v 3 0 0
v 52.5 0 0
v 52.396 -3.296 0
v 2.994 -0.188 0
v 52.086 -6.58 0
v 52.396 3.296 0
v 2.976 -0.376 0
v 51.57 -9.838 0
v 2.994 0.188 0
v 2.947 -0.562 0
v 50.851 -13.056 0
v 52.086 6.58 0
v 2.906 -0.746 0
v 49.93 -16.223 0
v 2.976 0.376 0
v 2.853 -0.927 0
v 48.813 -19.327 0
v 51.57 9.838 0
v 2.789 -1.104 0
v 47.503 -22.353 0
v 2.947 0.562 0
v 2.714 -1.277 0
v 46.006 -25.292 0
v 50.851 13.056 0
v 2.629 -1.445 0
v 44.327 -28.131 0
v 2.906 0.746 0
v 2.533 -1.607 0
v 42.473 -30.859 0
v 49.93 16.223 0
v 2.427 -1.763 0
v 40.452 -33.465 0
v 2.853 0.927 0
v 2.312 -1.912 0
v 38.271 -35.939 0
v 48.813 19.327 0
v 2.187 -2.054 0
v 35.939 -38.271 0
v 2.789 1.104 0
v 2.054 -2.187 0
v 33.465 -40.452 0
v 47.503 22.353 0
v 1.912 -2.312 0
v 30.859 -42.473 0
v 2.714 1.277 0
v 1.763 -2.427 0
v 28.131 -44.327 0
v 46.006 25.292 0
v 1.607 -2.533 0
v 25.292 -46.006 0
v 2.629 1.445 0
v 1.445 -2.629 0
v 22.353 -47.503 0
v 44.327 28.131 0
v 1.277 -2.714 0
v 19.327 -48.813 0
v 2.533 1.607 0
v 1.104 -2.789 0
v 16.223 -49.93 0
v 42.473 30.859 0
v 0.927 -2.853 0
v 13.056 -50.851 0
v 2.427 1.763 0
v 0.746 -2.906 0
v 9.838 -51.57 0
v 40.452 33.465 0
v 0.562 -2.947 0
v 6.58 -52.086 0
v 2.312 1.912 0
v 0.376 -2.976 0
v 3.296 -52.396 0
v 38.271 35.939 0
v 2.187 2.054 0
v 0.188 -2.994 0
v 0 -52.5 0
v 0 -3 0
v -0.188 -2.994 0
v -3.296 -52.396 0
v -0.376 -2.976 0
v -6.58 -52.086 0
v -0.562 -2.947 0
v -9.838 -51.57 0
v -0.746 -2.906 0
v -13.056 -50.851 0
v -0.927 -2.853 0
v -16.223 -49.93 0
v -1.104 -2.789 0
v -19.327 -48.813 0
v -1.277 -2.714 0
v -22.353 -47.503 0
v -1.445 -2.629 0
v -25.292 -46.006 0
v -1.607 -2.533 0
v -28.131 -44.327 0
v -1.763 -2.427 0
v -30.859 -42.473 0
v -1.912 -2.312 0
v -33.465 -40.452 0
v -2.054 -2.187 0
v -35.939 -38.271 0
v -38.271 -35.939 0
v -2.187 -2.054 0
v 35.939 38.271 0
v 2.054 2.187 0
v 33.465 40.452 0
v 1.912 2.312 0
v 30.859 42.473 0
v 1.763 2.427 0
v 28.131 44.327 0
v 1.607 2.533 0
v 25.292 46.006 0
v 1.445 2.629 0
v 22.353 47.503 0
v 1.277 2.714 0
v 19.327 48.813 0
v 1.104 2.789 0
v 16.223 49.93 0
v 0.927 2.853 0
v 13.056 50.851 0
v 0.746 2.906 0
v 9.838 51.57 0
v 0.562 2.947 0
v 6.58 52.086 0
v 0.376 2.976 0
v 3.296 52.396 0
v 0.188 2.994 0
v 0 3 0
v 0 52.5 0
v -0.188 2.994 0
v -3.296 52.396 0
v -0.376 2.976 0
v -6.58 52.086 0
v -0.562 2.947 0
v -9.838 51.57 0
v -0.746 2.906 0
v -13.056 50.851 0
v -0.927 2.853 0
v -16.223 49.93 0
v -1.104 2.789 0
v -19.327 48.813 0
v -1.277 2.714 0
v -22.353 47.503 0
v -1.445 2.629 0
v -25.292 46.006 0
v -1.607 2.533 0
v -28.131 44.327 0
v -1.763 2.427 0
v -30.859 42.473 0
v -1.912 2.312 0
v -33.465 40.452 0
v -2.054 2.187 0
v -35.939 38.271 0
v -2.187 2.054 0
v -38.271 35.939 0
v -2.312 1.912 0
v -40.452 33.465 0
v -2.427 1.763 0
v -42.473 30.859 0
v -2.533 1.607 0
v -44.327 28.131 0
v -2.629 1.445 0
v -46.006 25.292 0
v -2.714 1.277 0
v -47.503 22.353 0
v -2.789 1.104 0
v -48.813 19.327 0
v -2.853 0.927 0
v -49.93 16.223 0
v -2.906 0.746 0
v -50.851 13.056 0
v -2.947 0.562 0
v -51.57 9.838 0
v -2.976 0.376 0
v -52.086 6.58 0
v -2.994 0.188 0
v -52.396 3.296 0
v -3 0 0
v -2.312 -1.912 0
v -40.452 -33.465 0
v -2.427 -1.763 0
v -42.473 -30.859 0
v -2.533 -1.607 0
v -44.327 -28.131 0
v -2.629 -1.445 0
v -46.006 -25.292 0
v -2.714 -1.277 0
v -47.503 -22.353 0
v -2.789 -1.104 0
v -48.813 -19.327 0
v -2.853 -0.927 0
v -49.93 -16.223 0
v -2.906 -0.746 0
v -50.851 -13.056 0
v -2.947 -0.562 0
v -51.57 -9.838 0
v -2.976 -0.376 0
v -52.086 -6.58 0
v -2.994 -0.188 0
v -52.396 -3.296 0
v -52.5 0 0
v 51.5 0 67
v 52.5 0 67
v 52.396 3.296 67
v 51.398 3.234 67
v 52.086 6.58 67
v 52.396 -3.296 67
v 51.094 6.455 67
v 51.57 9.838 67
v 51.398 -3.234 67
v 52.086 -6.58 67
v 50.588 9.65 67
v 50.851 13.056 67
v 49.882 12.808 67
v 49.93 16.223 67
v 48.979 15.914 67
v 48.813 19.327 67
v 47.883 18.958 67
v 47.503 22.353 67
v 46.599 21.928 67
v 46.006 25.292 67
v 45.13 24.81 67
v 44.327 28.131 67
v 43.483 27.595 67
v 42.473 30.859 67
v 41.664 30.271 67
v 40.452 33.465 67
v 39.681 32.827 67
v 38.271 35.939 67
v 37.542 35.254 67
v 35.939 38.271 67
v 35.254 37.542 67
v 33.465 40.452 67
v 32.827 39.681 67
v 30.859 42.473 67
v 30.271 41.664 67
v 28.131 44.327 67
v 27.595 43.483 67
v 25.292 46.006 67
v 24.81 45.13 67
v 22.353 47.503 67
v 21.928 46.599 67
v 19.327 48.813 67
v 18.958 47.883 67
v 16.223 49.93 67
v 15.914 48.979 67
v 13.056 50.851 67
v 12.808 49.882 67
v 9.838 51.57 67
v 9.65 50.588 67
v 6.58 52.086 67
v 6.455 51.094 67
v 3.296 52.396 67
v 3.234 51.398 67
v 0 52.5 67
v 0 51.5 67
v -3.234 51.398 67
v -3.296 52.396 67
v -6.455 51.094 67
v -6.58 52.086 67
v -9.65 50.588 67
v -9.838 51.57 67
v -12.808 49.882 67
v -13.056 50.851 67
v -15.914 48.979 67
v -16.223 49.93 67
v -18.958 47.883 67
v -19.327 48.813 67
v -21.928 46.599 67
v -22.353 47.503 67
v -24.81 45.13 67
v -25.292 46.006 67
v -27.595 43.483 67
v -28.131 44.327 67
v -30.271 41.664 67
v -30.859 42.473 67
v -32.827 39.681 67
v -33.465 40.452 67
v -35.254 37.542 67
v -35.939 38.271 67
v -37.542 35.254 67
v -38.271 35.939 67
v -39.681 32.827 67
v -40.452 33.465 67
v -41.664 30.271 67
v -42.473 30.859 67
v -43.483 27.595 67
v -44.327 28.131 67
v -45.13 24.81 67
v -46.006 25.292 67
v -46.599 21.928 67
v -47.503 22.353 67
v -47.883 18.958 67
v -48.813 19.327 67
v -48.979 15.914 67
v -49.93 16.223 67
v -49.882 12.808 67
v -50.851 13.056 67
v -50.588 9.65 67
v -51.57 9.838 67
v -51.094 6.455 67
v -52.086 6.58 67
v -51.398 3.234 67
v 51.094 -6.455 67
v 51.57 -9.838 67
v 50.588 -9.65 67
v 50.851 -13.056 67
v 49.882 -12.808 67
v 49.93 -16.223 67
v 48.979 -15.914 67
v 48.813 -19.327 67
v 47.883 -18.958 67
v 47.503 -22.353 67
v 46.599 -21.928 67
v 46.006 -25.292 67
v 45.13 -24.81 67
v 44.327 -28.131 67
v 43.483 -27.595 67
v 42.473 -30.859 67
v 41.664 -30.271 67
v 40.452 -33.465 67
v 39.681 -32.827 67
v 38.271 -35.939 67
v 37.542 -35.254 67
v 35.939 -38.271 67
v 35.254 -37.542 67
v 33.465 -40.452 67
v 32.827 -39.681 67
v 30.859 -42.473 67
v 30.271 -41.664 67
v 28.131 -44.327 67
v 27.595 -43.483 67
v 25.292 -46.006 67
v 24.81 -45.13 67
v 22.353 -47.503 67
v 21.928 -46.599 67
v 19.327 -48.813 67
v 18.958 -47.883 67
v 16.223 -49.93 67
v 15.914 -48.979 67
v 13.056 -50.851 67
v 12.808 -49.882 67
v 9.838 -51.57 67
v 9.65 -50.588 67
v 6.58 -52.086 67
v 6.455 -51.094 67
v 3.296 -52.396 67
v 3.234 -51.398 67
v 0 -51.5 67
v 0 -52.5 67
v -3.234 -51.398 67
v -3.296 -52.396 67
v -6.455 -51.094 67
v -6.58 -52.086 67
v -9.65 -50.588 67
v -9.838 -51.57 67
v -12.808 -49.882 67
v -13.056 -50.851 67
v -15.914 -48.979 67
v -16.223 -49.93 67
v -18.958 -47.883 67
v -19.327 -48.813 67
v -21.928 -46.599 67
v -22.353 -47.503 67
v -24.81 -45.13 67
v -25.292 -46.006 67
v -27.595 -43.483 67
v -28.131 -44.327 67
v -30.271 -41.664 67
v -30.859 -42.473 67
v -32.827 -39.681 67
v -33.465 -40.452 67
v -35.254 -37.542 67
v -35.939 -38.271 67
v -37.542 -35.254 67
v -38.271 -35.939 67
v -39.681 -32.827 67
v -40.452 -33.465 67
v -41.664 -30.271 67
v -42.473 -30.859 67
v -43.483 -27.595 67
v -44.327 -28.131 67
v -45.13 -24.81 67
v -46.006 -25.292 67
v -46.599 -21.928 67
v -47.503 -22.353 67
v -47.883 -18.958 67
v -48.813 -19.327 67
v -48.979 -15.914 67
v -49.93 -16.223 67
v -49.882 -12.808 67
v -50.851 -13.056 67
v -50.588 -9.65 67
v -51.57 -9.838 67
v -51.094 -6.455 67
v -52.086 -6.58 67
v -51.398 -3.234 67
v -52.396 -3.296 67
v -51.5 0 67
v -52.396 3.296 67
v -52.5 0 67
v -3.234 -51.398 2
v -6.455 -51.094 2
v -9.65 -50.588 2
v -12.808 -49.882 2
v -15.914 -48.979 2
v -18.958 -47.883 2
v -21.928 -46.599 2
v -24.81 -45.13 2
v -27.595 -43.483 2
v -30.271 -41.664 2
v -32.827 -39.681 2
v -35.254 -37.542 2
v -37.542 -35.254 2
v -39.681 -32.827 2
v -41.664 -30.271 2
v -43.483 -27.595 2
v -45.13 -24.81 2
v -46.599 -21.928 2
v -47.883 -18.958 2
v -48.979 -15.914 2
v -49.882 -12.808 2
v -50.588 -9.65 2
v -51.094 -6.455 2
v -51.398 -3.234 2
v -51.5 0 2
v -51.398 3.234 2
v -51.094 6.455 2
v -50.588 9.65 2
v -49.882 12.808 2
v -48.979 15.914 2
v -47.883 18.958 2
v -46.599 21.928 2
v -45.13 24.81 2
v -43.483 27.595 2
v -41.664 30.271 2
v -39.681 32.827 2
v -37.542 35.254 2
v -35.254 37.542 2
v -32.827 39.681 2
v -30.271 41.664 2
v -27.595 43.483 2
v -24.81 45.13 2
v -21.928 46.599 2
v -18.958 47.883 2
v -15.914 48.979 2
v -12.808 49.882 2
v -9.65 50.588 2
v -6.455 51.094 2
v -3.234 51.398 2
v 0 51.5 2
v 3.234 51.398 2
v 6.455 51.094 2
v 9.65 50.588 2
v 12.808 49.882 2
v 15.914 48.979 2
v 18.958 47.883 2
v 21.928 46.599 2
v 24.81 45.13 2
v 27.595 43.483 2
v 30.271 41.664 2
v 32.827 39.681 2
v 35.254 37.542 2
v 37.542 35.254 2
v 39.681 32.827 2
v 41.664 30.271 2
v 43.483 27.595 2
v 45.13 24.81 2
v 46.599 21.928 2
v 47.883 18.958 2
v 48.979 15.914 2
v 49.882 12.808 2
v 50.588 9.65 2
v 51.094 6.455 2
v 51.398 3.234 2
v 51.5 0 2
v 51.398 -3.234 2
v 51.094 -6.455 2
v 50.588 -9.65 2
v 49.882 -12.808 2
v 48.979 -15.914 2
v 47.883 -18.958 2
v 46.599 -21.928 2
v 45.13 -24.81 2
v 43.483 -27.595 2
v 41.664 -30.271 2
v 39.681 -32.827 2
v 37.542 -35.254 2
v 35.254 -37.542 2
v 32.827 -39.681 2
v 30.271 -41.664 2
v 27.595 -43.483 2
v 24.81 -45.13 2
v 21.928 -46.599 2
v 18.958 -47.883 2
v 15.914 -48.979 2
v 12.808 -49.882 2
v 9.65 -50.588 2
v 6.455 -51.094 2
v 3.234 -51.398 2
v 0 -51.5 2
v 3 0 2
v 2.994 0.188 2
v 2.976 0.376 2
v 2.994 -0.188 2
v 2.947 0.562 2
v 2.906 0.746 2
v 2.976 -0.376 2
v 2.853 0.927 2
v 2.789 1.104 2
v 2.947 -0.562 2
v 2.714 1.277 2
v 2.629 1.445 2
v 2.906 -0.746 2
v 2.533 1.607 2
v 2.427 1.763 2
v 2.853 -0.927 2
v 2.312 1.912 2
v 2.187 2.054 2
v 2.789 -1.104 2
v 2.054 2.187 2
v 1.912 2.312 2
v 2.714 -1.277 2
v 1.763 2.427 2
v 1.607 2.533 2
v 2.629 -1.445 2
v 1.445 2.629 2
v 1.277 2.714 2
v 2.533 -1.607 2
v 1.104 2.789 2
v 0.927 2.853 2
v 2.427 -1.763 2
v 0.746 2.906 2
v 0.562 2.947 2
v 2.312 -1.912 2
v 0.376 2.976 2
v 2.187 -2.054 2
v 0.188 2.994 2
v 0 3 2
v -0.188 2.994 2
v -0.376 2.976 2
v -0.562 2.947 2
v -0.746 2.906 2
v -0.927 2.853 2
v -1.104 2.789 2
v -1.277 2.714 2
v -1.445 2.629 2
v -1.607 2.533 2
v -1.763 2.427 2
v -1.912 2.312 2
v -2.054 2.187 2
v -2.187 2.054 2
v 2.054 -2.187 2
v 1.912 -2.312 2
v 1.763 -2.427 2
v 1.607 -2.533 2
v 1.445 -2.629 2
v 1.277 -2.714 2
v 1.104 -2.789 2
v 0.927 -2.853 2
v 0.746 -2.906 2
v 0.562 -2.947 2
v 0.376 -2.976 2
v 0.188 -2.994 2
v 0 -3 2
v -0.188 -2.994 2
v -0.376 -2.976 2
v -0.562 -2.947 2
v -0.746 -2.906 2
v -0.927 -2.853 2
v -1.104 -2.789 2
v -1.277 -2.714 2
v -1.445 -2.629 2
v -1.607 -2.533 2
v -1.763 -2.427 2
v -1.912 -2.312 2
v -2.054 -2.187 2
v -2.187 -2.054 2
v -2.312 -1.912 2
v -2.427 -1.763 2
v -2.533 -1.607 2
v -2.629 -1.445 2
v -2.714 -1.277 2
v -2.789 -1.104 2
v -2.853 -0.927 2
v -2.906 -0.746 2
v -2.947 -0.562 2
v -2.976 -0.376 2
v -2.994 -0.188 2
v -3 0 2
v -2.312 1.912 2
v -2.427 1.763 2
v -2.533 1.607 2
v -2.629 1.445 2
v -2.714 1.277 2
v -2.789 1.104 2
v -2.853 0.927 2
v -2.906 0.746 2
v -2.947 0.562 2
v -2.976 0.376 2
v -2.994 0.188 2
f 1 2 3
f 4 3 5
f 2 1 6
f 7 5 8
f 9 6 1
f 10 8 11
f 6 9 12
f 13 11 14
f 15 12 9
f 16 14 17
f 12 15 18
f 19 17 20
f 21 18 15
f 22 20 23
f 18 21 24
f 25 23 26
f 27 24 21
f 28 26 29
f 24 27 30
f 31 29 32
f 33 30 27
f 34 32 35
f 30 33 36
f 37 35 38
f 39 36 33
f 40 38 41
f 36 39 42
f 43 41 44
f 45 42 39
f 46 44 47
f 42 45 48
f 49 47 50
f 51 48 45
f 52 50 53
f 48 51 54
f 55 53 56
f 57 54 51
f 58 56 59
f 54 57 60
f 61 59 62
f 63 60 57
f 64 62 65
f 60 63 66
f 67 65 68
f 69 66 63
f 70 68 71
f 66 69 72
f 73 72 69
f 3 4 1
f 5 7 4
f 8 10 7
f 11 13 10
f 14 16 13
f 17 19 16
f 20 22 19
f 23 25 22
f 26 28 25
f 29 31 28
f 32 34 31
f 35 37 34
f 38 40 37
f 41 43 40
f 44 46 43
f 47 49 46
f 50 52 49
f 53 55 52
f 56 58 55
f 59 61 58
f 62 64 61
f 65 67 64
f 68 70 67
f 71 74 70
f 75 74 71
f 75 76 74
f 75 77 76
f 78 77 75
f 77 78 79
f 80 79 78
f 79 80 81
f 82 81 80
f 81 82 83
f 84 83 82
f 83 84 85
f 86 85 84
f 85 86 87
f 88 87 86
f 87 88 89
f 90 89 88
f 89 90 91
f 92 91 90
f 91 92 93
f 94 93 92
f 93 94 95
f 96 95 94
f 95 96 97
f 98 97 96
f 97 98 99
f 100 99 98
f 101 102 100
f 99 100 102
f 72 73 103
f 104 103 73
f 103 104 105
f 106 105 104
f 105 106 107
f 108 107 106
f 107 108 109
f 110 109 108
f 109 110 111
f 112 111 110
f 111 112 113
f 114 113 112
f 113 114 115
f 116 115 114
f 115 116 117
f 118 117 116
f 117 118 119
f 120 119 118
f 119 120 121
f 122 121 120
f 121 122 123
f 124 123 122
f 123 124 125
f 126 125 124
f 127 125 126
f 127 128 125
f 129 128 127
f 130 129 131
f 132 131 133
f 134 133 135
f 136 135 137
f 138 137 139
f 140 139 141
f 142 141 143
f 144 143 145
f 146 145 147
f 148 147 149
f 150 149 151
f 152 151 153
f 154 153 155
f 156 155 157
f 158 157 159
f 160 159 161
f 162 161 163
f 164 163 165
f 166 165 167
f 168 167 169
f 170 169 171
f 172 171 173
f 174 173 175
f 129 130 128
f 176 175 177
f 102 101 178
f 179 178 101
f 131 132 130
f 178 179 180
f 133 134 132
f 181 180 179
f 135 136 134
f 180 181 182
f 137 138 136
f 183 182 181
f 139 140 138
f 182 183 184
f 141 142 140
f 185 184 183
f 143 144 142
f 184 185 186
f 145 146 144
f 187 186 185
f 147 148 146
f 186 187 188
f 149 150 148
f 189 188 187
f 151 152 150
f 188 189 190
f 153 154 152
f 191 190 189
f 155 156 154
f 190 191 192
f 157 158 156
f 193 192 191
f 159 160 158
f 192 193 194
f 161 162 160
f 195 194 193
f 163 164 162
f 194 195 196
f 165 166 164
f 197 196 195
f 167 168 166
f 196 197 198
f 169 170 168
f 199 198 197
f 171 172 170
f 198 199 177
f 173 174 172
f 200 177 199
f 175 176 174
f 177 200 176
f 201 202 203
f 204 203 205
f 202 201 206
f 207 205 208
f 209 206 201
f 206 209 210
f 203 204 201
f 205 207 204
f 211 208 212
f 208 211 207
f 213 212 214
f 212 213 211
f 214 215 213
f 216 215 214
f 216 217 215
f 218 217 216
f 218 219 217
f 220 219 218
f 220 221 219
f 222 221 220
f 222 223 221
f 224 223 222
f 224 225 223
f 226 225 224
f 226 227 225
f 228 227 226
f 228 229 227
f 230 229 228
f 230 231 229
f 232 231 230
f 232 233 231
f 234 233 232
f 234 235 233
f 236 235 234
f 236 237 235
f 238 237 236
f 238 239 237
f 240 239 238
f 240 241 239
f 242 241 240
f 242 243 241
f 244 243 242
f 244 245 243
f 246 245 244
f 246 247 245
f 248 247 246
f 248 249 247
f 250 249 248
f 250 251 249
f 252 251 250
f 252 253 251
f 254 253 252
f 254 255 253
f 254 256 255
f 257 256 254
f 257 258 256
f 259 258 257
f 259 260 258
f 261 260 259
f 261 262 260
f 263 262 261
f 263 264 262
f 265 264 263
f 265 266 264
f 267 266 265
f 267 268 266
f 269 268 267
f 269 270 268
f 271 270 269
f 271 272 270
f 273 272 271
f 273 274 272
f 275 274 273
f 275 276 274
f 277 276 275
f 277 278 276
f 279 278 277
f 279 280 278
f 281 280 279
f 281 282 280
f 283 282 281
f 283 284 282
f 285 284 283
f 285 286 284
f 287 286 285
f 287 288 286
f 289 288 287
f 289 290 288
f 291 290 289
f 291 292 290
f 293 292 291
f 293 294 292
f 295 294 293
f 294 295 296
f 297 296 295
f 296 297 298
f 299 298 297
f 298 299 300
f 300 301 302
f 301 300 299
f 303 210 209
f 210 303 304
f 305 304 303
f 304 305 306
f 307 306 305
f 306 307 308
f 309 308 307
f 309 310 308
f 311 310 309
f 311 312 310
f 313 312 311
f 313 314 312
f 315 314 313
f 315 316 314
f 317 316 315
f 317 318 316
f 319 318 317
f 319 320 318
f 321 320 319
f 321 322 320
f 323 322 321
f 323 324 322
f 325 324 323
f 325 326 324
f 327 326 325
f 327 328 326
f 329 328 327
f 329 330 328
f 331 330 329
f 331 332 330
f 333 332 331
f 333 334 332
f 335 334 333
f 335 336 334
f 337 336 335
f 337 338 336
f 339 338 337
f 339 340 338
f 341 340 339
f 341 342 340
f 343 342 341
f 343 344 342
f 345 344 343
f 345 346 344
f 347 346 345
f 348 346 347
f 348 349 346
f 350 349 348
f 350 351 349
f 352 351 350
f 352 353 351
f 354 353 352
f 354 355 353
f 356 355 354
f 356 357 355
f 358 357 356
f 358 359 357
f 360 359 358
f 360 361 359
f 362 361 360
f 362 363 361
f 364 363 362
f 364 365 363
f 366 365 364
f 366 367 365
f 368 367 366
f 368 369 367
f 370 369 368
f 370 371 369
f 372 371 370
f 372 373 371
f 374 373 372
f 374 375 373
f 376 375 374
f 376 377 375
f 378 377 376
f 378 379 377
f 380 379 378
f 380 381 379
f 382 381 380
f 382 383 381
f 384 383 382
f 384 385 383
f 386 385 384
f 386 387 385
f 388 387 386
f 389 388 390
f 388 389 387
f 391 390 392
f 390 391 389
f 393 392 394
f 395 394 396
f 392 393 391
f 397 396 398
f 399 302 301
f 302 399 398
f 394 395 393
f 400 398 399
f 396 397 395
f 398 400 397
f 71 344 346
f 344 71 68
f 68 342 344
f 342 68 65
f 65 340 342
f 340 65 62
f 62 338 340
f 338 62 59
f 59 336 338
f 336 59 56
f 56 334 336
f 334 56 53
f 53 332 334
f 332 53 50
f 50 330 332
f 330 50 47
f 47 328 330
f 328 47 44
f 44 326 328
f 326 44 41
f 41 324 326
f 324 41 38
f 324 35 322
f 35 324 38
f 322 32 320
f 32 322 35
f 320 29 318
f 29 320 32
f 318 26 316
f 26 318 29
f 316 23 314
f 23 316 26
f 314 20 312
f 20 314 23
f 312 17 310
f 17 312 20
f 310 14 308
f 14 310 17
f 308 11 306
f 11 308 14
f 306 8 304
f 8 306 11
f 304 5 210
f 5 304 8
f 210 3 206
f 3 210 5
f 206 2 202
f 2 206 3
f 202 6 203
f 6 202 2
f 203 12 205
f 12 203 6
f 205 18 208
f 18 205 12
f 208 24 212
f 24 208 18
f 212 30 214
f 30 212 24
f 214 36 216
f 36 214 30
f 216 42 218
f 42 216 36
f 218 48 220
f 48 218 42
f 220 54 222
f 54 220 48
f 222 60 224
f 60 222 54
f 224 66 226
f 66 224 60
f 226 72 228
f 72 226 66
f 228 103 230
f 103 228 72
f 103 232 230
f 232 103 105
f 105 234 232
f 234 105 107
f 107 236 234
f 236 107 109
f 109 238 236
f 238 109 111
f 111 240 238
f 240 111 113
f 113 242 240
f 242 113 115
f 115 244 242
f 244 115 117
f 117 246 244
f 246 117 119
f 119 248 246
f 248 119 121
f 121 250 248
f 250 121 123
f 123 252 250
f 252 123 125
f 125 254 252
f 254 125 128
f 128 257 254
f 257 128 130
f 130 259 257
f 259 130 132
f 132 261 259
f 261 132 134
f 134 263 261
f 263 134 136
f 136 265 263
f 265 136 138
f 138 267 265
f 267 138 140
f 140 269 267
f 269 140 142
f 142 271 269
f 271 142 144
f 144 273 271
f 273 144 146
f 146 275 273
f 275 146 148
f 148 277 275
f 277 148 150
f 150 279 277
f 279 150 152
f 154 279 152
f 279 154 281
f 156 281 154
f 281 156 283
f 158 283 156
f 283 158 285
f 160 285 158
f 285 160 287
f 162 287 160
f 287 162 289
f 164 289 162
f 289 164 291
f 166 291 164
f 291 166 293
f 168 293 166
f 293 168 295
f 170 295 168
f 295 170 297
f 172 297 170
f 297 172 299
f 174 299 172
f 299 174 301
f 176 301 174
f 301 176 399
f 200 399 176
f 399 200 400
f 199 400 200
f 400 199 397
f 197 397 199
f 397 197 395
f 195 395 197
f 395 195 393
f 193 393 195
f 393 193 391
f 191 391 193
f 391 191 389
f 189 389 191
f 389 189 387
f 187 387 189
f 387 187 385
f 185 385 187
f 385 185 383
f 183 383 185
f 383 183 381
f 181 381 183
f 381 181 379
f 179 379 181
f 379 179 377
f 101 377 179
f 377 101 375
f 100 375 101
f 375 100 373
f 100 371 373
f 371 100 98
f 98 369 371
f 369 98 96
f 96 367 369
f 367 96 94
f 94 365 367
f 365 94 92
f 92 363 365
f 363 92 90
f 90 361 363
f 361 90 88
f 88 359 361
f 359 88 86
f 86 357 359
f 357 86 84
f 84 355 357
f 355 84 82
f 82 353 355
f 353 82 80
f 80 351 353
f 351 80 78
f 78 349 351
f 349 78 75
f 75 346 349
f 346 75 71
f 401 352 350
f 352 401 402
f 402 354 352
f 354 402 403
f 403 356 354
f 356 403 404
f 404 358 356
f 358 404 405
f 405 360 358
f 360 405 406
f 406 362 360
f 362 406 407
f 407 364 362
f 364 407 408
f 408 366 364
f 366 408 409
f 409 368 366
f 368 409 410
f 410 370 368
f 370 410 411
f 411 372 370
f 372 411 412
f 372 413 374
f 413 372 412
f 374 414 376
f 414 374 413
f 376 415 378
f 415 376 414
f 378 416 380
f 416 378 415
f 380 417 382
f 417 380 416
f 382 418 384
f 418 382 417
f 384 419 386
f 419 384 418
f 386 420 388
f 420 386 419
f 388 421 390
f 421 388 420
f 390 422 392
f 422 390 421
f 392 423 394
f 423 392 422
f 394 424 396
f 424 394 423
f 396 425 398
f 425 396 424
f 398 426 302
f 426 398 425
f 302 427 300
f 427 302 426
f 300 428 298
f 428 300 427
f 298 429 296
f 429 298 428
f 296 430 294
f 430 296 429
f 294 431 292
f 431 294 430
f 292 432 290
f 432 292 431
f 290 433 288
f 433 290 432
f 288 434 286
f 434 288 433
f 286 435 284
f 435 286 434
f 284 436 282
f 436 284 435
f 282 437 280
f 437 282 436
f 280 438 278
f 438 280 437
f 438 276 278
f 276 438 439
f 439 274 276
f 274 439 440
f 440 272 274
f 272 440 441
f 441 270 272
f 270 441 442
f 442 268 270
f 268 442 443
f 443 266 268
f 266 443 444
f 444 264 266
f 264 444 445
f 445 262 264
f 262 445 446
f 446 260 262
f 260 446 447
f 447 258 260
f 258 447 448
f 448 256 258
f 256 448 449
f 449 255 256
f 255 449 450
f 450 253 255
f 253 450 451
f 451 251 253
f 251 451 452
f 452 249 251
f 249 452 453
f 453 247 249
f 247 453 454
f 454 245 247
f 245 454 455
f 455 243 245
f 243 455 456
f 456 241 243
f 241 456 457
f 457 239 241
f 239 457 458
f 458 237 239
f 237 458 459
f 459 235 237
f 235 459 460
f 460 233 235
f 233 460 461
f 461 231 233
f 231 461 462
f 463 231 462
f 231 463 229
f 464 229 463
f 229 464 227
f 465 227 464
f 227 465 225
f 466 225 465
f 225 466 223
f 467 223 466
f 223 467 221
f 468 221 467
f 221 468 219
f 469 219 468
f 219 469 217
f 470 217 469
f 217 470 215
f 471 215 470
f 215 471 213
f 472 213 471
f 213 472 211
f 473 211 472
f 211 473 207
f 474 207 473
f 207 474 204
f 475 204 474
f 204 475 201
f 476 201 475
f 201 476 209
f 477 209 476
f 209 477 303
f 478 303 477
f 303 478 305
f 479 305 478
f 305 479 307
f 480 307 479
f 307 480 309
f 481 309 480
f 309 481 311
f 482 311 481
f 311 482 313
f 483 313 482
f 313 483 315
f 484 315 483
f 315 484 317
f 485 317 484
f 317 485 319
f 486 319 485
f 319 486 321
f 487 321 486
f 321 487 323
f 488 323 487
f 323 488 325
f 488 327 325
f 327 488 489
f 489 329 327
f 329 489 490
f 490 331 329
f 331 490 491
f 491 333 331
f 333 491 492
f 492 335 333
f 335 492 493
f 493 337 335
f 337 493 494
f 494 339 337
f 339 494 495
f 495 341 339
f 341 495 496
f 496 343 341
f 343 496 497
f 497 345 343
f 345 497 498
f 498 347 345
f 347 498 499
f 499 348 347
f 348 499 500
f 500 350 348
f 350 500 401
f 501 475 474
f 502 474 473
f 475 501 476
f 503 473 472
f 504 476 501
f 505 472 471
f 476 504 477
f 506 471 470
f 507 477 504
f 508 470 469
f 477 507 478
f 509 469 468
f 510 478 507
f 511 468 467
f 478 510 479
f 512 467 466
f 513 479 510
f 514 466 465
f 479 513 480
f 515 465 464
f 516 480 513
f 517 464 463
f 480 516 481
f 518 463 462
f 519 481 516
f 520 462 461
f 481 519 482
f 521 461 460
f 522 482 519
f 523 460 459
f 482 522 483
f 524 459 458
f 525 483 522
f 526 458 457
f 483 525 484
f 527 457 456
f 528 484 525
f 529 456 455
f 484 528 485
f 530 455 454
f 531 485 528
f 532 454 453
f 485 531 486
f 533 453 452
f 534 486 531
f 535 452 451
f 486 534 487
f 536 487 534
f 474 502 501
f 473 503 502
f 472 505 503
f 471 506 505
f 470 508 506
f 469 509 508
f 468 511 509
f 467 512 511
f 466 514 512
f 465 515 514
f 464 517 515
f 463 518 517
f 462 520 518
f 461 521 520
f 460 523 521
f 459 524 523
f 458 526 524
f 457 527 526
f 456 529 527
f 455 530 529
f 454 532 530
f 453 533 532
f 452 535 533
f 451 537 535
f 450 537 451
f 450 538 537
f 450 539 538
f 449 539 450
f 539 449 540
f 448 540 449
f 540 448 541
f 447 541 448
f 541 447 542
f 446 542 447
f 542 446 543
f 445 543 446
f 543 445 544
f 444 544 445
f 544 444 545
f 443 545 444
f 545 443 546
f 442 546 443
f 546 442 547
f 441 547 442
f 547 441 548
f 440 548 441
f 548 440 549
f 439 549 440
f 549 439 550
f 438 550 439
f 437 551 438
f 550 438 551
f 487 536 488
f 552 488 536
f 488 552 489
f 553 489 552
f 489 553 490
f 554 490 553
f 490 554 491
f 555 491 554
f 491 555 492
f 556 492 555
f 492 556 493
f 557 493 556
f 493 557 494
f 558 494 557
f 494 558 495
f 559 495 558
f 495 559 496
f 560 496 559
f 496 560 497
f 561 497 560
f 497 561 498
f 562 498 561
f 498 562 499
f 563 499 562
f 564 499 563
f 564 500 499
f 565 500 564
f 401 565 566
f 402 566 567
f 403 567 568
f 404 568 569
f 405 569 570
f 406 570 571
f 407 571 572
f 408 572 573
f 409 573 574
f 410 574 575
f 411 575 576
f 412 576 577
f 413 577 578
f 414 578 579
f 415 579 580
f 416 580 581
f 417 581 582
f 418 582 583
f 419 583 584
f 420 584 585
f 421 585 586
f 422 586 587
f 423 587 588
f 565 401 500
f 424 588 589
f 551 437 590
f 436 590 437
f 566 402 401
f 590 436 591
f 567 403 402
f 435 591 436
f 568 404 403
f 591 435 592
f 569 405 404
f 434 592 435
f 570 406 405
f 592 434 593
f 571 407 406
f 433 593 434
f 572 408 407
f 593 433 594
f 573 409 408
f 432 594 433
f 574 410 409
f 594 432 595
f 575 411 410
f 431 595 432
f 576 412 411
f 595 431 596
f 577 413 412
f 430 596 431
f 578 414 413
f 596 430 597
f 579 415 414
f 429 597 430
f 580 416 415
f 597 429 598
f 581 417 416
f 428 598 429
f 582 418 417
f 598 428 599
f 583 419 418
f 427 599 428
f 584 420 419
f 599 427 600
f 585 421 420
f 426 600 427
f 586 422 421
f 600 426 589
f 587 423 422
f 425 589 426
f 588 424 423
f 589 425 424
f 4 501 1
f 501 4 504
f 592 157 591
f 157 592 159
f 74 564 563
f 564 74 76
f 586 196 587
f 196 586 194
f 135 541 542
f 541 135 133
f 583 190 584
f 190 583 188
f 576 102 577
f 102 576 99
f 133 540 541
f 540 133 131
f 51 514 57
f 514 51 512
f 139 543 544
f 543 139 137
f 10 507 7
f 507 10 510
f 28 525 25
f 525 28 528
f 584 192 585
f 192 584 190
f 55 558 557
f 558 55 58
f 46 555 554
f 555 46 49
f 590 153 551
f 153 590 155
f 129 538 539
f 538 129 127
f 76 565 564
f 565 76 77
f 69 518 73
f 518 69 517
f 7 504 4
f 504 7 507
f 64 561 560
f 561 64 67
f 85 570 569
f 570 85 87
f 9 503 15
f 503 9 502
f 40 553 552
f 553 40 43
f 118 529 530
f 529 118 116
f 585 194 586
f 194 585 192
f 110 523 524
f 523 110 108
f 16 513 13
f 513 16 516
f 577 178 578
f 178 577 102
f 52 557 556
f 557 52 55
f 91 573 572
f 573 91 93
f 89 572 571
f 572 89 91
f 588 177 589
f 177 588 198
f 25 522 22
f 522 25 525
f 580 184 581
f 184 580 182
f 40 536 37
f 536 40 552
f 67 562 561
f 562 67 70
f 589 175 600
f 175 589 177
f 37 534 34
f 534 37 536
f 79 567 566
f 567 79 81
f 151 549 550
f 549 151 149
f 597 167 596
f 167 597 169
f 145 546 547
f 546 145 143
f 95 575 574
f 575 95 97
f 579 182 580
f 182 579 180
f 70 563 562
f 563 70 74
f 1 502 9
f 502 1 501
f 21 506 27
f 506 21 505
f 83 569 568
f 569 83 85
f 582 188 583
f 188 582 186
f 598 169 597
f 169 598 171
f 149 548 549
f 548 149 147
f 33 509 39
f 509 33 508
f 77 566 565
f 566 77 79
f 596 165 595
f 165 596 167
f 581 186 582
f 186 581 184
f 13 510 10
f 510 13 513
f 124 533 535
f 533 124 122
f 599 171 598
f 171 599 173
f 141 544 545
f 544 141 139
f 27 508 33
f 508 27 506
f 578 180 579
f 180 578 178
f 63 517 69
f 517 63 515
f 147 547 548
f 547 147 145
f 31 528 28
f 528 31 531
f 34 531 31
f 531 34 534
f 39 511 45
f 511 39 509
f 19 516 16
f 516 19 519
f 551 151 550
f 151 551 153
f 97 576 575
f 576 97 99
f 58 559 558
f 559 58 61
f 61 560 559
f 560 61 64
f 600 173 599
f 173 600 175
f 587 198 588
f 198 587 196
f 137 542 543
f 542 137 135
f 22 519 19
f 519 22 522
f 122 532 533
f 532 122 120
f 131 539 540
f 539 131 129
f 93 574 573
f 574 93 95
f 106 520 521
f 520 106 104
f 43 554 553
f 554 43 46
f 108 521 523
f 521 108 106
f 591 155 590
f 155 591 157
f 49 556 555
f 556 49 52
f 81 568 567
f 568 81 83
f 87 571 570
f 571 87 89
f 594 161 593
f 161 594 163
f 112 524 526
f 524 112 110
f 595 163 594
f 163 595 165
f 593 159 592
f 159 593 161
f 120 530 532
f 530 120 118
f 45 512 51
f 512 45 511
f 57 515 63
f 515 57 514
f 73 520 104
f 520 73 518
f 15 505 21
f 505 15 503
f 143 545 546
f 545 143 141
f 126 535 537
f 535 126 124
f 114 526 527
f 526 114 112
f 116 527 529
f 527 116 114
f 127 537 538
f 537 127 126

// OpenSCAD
/*
Cup holder Diameter = 109mm, Height = 77 mm
Best values for Cup holder are; Diameter = 103mm, Height = 67 mm
Two of the Stands are tight with these values
The other Stand is slightly larger and these values are snug.
Diameter = 105mm, Height = 67 mm
*/
$fn = 100;
height = 67;
diameter = 105;
radius = diameter/2;

//width = height*2;;
wall = 2;
//height2 = height - 2;

difference()
{
    cupHolder(diameter, height, wall);
    drainHole(3*wall,wall);
}

module cupHolder(diameter, height, wall)
{
    linear_extrude(height,true)
    difference()
    {
        circle(d=diameter);
        circle(d=diameter-wall);
    }
    linear_extrude(wall,true)
    circle(d=diameter-wall);
}

module drainHole(diameter,height)
{
    linear_extrude(height,true)
    circle(d=diameter);
}
